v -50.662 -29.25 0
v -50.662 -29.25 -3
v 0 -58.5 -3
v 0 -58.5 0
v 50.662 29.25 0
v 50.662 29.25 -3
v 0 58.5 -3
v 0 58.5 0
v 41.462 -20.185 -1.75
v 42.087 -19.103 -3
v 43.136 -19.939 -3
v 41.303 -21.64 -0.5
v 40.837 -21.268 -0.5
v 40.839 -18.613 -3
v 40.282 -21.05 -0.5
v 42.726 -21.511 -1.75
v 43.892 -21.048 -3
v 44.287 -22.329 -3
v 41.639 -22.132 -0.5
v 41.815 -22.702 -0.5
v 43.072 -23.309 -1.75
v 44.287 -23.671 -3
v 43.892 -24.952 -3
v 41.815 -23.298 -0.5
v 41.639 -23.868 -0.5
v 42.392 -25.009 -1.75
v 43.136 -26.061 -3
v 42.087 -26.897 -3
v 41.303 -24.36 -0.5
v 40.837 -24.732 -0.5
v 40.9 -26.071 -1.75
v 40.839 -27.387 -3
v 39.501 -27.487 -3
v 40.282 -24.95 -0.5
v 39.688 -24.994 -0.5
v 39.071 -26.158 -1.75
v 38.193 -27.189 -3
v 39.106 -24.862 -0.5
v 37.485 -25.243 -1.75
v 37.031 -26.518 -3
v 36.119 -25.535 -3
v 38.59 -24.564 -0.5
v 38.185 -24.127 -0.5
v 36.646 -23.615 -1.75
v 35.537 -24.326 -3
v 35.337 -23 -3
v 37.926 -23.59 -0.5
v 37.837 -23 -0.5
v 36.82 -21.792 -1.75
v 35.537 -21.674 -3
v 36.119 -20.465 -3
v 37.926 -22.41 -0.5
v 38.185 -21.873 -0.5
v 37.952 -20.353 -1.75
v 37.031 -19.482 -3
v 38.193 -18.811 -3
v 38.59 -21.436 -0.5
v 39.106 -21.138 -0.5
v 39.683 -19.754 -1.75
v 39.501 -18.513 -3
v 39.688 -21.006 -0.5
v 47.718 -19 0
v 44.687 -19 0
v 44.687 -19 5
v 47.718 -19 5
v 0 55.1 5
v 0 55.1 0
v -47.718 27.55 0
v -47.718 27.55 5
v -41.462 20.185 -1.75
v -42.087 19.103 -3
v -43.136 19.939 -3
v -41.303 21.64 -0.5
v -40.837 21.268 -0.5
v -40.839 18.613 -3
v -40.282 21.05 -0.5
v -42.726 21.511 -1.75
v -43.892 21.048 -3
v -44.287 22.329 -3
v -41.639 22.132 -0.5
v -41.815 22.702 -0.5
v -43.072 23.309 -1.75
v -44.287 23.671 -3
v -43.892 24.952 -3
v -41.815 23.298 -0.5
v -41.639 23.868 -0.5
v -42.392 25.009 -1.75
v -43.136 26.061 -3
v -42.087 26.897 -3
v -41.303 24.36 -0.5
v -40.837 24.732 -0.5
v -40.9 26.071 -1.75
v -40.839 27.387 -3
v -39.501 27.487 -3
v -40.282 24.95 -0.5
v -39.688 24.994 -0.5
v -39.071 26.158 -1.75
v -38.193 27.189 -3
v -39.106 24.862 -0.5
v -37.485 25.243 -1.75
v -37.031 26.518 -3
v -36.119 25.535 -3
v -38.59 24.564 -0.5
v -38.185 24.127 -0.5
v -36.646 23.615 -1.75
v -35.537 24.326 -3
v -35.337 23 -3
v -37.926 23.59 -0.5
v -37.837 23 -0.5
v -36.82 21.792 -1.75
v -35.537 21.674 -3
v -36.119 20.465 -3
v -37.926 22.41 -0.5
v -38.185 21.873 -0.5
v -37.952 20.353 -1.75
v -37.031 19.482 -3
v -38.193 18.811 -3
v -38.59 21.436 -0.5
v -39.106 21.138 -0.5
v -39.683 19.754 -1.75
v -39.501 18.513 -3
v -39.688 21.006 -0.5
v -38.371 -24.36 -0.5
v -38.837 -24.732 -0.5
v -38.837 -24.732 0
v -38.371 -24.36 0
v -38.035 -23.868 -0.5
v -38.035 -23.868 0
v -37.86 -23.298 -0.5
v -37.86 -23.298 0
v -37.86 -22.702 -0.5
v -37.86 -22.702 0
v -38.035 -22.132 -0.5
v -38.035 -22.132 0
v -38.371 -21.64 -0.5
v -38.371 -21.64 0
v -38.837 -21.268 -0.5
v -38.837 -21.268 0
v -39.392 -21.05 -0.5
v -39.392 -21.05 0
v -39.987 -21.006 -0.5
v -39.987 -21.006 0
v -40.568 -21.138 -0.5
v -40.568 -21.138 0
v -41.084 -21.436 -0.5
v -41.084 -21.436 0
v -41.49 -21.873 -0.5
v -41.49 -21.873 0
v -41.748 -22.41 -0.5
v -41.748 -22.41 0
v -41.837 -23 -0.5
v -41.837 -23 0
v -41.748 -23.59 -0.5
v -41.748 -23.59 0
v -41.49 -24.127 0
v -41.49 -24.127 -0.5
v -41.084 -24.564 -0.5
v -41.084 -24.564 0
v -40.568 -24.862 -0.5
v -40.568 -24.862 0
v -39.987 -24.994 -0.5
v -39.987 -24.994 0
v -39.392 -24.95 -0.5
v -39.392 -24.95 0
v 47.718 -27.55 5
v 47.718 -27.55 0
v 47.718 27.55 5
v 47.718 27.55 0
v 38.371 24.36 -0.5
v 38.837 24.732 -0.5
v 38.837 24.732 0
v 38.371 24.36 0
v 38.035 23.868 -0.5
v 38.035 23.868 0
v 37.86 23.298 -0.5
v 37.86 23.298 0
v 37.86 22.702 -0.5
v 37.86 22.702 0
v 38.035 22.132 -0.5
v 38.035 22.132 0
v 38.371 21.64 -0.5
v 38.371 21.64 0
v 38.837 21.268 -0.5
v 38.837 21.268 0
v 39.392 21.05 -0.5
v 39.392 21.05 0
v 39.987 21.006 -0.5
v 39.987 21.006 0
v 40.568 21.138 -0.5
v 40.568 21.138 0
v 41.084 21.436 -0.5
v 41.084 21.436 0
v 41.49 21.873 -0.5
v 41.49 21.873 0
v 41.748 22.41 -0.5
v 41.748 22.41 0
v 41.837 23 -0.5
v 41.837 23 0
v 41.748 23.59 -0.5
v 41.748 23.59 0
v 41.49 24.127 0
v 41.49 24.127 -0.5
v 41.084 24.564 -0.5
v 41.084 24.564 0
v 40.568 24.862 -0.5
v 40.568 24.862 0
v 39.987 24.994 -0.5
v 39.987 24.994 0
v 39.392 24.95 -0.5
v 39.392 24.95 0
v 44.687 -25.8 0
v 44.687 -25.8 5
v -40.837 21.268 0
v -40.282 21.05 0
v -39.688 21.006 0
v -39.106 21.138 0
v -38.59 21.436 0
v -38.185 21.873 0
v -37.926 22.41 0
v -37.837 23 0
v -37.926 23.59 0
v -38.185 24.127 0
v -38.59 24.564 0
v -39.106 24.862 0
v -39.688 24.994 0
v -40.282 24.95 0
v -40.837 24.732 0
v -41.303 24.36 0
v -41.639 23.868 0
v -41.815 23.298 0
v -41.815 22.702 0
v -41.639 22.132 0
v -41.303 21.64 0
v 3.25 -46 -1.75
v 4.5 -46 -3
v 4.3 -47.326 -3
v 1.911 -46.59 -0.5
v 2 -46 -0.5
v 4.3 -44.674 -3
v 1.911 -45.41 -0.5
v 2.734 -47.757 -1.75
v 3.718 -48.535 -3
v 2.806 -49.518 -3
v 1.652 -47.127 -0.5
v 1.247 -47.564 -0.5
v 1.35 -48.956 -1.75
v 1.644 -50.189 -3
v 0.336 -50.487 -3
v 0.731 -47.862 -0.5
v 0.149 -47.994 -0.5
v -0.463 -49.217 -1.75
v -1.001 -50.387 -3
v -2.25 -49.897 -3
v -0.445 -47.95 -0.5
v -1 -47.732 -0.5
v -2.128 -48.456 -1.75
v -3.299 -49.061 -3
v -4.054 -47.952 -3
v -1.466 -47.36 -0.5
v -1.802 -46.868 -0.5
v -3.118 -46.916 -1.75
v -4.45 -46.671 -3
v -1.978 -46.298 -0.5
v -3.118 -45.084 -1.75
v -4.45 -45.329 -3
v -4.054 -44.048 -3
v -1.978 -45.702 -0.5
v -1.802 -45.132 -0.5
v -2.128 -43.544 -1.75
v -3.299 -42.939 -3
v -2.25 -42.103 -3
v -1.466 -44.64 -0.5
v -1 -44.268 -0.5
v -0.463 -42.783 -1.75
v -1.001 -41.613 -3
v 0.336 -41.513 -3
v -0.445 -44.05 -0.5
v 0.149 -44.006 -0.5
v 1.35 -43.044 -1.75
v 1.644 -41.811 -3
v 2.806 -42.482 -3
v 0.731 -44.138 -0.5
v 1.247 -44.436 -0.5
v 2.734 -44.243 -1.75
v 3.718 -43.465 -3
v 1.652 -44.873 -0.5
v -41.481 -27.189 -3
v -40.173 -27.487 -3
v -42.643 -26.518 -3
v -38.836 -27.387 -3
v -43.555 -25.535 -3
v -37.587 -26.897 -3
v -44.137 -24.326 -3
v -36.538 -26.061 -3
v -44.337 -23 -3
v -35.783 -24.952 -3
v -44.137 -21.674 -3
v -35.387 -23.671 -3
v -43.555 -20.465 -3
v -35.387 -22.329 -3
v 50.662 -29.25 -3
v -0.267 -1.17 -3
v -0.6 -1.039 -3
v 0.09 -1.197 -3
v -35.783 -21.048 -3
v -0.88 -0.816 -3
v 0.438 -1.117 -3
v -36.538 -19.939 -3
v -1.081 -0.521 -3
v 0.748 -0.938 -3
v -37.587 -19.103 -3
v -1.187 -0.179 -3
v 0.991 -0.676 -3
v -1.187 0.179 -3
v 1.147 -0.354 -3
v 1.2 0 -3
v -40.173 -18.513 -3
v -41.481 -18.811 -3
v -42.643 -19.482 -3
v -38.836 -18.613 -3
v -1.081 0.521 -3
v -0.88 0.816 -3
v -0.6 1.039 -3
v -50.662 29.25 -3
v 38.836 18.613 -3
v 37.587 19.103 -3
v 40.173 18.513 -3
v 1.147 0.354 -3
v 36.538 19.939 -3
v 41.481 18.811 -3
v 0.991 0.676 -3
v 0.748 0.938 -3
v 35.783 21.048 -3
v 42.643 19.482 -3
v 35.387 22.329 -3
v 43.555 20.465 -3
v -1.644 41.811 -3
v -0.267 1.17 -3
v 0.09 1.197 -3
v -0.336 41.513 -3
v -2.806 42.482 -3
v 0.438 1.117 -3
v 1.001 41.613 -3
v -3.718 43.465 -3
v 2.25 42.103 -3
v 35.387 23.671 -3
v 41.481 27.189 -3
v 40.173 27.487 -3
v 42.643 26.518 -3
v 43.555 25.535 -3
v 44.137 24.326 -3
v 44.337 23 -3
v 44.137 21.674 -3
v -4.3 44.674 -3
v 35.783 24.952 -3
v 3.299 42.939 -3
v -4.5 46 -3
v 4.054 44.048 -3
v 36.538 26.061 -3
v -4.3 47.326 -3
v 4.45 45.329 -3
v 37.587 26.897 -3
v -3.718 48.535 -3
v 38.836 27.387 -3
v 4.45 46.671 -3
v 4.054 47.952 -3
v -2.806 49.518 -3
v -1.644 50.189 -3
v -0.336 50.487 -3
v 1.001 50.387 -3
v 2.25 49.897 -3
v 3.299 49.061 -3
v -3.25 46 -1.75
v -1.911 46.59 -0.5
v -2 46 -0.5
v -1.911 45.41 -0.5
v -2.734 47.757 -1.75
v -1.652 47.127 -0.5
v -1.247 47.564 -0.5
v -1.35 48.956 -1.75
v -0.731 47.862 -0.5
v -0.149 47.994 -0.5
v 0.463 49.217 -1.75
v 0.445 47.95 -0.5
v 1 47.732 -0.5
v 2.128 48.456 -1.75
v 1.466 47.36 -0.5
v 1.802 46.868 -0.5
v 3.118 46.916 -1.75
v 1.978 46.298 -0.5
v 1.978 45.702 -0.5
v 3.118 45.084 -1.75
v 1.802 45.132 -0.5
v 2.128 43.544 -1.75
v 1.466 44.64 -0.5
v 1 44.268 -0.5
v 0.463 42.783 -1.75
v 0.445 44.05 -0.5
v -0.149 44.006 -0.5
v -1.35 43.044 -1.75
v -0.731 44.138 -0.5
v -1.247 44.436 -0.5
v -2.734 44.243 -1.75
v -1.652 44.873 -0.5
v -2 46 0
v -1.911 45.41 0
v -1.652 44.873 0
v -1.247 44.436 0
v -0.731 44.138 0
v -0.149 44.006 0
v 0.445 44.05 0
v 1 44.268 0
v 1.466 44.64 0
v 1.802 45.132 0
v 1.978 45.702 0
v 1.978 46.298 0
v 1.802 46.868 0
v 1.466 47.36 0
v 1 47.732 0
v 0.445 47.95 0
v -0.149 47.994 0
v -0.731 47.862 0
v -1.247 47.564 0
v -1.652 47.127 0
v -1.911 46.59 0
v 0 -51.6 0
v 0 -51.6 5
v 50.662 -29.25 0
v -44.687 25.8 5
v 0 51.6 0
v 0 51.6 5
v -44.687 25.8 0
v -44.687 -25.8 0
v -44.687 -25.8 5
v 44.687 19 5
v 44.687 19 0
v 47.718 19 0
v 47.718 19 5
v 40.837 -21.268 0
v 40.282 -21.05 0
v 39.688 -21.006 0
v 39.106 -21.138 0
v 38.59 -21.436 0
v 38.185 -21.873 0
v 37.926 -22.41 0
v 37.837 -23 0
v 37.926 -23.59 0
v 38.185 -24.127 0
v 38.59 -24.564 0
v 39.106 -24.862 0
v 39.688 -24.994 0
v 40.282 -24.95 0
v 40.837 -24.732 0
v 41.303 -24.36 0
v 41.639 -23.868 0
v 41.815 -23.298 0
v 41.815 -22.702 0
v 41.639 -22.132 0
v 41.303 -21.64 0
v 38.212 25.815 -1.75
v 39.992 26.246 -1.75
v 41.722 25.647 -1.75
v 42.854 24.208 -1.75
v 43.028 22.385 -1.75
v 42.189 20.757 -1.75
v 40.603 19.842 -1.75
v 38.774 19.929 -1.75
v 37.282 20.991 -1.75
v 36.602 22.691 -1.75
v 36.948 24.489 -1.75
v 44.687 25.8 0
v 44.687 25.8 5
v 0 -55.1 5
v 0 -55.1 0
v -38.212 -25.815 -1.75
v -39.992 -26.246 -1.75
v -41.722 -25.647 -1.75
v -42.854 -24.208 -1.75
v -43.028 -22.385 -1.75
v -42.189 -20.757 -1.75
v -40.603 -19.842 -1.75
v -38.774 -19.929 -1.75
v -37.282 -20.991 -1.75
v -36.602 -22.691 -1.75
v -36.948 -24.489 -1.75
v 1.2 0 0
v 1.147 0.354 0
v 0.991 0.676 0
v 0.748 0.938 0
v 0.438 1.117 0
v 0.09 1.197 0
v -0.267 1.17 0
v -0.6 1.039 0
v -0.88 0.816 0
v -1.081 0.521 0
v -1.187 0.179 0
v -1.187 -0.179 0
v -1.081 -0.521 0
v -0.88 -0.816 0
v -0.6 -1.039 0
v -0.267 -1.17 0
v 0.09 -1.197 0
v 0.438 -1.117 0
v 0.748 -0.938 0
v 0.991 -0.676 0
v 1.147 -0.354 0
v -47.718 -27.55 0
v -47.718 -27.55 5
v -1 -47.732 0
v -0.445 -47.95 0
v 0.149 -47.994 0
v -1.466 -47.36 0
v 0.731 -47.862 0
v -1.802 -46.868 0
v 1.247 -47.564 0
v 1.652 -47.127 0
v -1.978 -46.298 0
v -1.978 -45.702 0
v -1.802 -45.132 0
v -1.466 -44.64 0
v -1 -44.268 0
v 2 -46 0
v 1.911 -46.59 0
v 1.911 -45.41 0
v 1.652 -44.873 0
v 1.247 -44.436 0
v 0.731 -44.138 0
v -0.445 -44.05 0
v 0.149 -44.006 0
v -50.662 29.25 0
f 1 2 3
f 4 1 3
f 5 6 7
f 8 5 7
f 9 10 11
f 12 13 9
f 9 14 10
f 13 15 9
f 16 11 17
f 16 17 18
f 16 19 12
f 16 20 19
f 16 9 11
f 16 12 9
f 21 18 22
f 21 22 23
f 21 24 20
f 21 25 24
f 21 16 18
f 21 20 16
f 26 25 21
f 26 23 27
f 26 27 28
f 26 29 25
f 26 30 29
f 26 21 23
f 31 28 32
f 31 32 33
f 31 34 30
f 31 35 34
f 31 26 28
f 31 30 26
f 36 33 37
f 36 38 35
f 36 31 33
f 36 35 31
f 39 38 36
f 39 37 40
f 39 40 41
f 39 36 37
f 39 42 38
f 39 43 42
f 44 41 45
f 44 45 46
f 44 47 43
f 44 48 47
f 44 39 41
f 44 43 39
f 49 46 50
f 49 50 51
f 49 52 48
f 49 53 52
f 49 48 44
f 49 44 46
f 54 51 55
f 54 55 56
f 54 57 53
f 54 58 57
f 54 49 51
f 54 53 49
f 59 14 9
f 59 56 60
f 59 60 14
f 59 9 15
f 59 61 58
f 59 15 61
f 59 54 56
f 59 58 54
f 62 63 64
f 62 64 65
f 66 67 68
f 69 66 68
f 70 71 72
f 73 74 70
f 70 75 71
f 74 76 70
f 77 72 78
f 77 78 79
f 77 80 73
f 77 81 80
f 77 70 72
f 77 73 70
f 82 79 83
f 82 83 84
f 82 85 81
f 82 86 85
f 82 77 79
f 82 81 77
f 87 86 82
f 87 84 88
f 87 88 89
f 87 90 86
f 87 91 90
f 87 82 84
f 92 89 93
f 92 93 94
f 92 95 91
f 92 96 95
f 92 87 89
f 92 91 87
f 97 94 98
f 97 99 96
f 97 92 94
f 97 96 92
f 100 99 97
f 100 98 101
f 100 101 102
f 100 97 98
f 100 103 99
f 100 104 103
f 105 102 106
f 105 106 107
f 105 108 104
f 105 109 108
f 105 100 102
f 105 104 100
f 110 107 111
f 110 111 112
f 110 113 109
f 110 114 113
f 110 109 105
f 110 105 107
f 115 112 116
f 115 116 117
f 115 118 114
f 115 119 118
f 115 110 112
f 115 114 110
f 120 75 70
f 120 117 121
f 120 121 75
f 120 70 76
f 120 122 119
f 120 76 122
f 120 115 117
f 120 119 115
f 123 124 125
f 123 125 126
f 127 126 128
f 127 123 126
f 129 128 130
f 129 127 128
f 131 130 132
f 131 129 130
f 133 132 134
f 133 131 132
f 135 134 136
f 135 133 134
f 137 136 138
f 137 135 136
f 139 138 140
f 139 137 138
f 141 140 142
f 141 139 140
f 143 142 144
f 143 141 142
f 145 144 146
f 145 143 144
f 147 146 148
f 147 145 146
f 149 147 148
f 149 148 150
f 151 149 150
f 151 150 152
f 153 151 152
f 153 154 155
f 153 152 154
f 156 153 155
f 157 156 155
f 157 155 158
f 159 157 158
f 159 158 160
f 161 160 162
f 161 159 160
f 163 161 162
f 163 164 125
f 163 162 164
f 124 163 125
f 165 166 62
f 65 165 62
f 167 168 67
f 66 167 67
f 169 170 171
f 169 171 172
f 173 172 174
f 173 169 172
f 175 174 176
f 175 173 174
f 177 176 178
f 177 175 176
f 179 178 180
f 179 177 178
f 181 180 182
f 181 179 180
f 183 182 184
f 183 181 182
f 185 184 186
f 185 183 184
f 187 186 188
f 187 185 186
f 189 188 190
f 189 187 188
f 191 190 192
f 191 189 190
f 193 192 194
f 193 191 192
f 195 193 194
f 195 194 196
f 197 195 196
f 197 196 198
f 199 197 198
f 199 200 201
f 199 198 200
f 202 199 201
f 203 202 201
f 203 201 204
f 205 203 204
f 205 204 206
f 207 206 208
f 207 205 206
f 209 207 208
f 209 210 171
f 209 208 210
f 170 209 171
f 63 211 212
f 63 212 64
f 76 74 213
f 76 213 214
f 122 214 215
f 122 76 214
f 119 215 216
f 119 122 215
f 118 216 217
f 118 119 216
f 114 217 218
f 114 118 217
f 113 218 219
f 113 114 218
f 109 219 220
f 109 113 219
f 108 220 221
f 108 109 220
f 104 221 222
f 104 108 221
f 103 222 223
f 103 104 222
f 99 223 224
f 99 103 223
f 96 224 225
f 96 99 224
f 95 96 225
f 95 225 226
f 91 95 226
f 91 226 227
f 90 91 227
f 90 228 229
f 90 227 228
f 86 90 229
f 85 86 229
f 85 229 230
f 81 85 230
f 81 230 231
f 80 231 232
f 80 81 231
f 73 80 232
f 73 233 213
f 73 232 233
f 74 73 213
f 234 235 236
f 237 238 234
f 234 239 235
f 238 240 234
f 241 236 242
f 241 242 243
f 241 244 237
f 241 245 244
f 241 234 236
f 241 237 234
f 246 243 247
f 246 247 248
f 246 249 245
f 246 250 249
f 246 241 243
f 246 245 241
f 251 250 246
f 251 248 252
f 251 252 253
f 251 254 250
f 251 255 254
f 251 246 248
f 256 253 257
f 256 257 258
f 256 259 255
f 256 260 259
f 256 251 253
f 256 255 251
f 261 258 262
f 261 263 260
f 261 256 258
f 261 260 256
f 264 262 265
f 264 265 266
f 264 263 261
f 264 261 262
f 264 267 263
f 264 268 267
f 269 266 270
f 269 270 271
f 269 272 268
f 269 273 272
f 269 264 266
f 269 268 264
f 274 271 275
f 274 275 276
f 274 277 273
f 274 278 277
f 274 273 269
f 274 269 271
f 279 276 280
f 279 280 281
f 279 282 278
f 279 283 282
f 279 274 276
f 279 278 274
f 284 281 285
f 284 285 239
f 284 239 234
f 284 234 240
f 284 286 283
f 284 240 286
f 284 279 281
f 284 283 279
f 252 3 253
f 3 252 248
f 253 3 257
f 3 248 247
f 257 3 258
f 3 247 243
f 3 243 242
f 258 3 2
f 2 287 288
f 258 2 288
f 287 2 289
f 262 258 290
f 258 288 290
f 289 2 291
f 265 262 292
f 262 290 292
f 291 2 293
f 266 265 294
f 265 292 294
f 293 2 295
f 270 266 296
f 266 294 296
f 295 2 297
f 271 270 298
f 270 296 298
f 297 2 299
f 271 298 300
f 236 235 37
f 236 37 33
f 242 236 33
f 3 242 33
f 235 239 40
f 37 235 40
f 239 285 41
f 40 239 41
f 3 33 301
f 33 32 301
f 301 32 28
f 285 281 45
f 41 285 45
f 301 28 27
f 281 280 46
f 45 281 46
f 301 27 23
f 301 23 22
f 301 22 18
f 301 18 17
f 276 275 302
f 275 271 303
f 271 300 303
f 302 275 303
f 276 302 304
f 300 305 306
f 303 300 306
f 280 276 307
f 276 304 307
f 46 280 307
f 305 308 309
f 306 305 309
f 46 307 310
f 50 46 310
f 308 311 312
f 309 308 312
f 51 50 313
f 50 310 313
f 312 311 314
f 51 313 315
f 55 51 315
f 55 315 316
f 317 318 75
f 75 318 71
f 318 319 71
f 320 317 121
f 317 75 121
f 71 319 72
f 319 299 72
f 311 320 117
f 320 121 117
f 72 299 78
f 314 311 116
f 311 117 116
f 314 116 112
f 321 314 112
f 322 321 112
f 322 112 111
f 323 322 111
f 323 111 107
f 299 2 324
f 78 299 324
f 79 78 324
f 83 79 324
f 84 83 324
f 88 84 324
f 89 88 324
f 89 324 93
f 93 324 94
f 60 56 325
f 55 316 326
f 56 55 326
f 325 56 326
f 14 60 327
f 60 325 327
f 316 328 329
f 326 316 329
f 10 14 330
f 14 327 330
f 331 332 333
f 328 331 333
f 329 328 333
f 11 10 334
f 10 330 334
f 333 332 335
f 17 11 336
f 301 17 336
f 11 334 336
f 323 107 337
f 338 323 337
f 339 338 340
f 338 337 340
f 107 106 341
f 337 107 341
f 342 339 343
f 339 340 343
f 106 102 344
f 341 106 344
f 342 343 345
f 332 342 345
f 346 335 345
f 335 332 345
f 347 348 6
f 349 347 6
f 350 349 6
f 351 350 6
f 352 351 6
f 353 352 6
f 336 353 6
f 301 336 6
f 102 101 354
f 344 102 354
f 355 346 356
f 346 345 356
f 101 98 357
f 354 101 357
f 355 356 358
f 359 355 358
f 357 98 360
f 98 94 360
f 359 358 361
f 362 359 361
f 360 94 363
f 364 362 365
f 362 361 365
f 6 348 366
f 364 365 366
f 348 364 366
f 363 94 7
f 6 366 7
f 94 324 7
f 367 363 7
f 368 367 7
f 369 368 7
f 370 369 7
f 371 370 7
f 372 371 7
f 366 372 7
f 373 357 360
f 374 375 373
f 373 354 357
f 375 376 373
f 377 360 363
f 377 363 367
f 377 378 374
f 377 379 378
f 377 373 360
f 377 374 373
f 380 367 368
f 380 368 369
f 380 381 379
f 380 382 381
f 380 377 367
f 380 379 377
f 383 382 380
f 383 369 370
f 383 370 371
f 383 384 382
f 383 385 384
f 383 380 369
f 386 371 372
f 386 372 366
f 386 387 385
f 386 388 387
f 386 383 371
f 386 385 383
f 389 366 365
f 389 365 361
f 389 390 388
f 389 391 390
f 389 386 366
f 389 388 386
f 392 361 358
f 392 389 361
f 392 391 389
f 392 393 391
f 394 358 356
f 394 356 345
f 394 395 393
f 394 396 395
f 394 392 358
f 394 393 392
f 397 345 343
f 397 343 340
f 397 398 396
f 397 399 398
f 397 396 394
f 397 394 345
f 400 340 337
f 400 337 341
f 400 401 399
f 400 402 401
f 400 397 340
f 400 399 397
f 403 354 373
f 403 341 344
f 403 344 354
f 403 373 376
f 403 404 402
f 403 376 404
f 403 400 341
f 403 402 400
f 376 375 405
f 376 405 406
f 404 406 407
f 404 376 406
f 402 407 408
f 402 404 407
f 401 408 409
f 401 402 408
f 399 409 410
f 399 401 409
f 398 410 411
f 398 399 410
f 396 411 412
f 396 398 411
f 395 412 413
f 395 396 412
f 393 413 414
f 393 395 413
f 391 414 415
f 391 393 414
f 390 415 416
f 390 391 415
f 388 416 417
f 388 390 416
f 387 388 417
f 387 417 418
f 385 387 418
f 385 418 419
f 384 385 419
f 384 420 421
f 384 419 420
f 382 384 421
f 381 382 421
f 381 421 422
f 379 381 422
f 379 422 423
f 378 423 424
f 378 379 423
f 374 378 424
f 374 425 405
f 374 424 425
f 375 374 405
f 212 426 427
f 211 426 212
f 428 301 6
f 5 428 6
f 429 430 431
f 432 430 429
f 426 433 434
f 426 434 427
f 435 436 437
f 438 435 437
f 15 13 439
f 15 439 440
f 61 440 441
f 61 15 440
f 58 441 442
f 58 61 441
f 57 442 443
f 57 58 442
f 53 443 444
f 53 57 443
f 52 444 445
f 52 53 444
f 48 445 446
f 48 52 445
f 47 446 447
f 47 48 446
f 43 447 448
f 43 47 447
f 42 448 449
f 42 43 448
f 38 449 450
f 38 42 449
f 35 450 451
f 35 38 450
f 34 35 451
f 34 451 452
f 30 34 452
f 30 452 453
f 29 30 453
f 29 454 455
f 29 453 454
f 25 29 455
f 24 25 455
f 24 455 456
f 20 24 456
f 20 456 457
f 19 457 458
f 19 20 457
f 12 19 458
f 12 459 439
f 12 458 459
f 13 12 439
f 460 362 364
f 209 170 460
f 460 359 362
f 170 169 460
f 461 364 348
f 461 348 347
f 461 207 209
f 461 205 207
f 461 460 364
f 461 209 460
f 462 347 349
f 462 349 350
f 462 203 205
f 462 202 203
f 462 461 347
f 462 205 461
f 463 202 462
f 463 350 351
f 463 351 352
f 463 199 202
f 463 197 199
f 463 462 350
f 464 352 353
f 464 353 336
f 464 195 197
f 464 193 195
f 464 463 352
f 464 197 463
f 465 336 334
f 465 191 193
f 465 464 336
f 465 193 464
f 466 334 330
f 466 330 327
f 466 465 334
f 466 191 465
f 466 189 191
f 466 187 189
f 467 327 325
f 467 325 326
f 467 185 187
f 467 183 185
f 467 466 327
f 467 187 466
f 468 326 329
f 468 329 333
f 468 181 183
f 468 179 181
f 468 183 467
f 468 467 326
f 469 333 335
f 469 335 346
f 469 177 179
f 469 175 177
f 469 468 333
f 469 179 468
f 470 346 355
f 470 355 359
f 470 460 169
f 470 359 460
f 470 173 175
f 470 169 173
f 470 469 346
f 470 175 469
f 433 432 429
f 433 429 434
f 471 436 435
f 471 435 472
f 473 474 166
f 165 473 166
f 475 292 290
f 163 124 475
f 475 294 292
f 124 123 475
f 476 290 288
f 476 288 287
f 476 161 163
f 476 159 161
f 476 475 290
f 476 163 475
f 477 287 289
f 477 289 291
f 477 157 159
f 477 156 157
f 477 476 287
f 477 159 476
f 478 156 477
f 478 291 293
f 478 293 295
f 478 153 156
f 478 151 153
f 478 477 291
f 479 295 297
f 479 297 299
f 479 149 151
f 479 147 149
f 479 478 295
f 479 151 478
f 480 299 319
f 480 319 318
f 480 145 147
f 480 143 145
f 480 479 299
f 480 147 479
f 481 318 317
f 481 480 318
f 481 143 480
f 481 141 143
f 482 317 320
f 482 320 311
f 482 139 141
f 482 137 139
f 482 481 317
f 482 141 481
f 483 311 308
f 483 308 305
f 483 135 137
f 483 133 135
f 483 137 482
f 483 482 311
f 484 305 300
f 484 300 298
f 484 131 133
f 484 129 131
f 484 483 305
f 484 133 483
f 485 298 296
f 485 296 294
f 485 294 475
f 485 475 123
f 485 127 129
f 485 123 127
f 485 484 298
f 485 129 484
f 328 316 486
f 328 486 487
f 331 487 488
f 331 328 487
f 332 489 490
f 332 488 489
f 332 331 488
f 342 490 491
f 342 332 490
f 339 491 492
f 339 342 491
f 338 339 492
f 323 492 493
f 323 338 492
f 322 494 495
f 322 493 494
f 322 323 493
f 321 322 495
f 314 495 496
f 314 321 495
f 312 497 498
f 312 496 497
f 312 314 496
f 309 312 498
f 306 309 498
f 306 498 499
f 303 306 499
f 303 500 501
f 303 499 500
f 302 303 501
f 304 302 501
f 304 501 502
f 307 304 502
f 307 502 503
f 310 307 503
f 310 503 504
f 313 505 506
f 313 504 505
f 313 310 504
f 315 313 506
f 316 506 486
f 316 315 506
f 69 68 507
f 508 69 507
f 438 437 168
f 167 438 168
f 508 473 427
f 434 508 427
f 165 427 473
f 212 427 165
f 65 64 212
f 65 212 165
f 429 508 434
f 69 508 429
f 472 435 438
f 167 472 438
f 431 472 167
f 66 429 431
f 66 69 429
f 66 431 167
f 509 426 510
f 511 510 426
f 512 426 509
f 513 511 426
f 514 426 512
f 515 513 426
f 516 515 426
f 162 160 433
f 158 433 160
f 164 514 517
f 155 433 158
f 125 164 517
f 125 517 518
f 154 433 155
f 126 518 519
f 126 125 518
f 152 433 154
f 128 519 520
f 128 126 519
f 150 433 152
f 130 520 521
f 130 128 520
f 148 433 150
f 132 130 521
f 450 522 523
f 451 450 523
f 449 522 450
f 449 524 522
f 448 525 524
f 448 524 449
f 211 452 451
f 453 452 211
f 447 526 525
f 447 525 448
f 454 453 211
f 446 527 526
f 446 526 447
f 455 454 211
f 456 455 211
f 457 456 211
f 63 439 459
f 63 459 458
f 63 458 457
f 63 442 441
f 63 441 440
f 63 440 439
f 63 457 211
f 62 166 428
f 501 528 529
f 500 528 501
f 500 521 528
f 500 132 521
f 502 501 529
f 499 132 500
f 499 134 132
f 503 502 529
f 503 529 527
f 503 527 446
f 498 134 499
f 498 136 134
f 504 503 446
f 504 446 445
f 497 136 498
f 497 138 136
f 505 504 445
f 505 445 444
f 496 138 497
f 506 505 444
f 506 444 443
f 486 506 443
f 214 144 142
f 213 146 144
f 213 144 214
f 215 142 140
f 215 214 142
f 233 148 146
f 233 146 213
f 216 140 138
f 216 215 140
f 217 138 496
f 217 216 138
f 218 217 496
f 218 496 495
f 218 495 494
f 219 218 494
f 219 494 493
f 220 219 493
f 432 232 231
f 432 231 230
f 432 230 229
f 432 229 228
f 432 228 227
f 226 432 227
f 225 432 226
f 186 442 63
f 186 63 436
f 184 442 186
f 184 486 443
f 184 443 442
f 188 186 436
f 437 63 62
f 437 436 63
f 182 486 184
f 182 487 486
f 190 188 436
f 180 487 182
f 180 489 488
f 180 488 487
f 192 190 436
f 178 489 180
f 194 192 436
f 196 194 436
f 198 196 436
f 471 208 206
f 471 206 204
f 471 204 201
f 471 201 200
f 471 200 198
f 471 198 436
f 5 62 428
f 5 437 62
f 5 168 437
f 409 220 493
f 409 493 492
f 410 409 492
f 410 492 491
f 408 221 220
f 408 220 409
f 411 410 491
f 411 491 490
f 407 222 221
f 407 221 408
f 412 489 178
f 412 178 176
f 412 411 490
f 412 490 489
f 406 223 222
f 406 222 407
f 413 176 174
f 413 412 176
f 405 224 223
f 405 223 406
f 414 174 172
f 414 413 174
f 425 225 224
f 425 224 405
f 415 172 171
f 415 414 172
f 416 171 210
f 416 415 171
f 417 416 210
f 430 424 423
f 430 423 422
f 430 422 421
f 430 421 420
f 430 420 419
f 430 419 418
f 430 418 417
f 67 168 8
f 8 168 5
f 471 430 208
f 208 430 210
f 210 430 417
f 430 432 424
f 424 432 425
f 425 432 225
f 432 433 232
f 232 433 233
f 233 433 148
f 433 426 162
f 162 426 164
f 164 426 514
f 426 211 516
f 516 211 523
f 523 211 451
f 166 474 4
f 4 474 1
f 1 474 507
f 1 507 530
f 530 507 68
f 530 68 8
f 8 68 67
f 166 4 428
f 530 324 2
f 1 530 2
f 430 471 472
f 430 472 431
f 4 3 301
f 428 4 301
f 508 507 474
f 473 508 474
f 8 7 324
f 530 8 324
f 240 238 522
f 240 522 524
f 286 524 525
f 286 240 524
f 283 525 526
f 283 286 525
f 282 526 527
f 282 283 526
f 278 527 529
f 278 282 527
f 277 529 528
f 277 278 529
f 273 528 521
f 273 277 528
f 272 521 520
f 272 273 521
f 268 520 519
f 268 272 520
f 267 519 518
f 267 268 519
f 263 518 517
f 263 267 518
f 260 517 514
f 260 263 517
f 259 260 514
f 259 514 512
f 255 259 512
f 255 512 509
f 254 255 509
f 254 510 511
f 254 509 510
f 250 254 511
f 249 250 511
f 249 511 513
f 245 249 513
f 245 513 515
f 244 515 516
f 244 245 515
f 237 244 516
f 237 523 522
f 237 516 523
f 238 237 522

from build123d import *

# Parameters (mm, degrees)
CYLINDER050_R            = 2
CYLINDER050_DEPTH        = 21
ARRAY002_COUNT           = 6
CYLINDER043_R            = 1.2
CYLINDER043_DEPTH        = 10
PRISM002_DEPTH           = 3
PRISM002_PLACEMENT_ANGLE = 30
BOX010_W                 = 5
BOX010_H                 = 38
BOX010_DEPTH             = 10
PRISM004_DEPTH           = 11
PRISM004_PLACEMENT_ANGLE = 30
PRISM003_DEPTH           = 5
PRISM003_PLACEMENT_ANGLE = 30
CHAMFER007_SIZE          = 2.5


with BuildPart() as agujeros_tornillos_tapa_inferior:
    # Cylinder050 → Cylinder050 (new body)
    with BuildSketch(Plane(origin=(0, -46, -8), x_dir=(1, 0, 0), z_dir=(0, 0, 1))):
        Circle(CYLINDER050_R)
    extrude(amount=CYLINDER050_DEPTH)

    # Array002: agujeros tornillos tapa inferior ×6 about axis
    array002_axis = Axis((0, 0, 0), (0, 0, 1))


with BuildPart() as agujeros_tornillos_tapa_inferior_1:
    add(agujeros_tornillos_tapa_inferior.part)
    for i in range(1, ARRAY002_COUNT):
        add(agujeros_tornillos_tapa_inferior.part.rotate(array002_axis, i * 360 / ARRAY002_COUNT))


with BuildPart() as cilindro019:
    # Cylinder043 → Cylinder043 (new body)
    with BuildSketch(Plane.XY.offset(-6)):
        Circle(CYLINDER043_R)
    extrude(amount=CYLINDER043_DEPTH)


with BuildPart() as tapa_con_agujero_pulsaor:
    # Prism002 → Prism002 (new body)
    with BuildSketch(Plane.XY):
        Polygon((58.5, 0), (29.25, 50.662486), (-29.25, 50.662486), (-58.5, 0), (-29.25, -50.662486), (29.25, -50.662486), align=None)
    extrude(amount=PRISM002_DEPTH)


with BuildPart() as tapa_con_agujero_pulsaor_1:
    # Prism002 placement: moved
    add(tapa_con_agujero_pulsaor.part.moved(Location((0, 0, -3))).rotate(Axis((0, 0, -3), (0, 0, 1)), PRISM002_PLACEMENT_ANGLE))

    # Cut011: cut Cilindro019
    add(cilindro019.part, mode=Mode.SUBTRACT)


with BuildPart() as cubo007:
    # Box010 → Box010 (new body)
    with BuildSketch(Plane(origin=(43.7, -19, 0), x_dir=(1, 0, 0), z_dir=(0, 0, 1))):
        with Locations((2.5, 19)):
            Rectangle(BOX010_W, BOX010_H)
    extrude(amount=BOX010_DEPTH)


with BuildPart() as tapa002:
    # Prism004 → Prism004 (new body)
    with BuildSketch(Plane.XY):
        Polygon((51.6, 0), (25.8, 44.686911), (-25.8, 44.686911), (-51.6, 0), (-25.8, -44.686911), (25.8, -44.686911), align=None)
    extrude(amount=PRISM004_DEPTH)


with BuildPart() as tapa002_1:
    # Prism004 placement: moved
    add(tapa002.part.rotate(Axis((0, 0, 0), (0, 0, 1)), PRISM004_PLACEMENT_ANGLE))


with BuildPart() as tapa_inferior_con_chanfler_tornillos:
    # Prism003 → Prism003 (new body)
    with BuildSketch(Plane.XY):
        Polygon((55.1, 0), (27.55, 47.718), (-27.55, 47.718), (-55.1, 0), (-27.55, -47.718), (27.55, -47.718), align=None)
    extrude(amount=PRISM003_DEPTH)


with BuildPart() as tapa_inferior_con_chanfler_tornillos_1:
    # Prism003 placement: moved
    add(tapa_inferior_con_chanfler_tornillos.part.rotate(Axis((0, 0, 0), (0, 0, 1)), PRISM003_PLACEMENT_ANGLE))

    # Cut006: cut tapa002
    add(tapa002_1.part, mode=Mode.SUBTRACT)

    # Cut007: cut Cubo007
    add(cubo007.part, mode=Mode.SUBTRACT)

    # Fusion006: union tapa con agujero pulsaor
    add(tapa_con_agujero_pulsaor_1.part)

    # Cut021: cut agujeros tornillos tapa inferior
    add(agujeros_tornillos_tapa_inferior_1.part, mode=Mode.SUBTRACT)

    # Chamfer007
    chamfer007_edges = [tapa_inferior_con_chanfler_tornillos_1.edges().sort_by_distance(p)[0] for p in [
        (-2, -46, -3),
        (38.837169, -24.732051, -3),
        (2, 46, -3),
        (-38.837169, 24.732051, -3),
        (-40.837169, -21.267949, -3),
        (40.837169, 21.267949, -3),
    ]]
    chamfer(chamfer007_edges, length=CHAMFER007_SIZE)


solid = tapa_inferior_con_chanfler_tornillos_1.part
